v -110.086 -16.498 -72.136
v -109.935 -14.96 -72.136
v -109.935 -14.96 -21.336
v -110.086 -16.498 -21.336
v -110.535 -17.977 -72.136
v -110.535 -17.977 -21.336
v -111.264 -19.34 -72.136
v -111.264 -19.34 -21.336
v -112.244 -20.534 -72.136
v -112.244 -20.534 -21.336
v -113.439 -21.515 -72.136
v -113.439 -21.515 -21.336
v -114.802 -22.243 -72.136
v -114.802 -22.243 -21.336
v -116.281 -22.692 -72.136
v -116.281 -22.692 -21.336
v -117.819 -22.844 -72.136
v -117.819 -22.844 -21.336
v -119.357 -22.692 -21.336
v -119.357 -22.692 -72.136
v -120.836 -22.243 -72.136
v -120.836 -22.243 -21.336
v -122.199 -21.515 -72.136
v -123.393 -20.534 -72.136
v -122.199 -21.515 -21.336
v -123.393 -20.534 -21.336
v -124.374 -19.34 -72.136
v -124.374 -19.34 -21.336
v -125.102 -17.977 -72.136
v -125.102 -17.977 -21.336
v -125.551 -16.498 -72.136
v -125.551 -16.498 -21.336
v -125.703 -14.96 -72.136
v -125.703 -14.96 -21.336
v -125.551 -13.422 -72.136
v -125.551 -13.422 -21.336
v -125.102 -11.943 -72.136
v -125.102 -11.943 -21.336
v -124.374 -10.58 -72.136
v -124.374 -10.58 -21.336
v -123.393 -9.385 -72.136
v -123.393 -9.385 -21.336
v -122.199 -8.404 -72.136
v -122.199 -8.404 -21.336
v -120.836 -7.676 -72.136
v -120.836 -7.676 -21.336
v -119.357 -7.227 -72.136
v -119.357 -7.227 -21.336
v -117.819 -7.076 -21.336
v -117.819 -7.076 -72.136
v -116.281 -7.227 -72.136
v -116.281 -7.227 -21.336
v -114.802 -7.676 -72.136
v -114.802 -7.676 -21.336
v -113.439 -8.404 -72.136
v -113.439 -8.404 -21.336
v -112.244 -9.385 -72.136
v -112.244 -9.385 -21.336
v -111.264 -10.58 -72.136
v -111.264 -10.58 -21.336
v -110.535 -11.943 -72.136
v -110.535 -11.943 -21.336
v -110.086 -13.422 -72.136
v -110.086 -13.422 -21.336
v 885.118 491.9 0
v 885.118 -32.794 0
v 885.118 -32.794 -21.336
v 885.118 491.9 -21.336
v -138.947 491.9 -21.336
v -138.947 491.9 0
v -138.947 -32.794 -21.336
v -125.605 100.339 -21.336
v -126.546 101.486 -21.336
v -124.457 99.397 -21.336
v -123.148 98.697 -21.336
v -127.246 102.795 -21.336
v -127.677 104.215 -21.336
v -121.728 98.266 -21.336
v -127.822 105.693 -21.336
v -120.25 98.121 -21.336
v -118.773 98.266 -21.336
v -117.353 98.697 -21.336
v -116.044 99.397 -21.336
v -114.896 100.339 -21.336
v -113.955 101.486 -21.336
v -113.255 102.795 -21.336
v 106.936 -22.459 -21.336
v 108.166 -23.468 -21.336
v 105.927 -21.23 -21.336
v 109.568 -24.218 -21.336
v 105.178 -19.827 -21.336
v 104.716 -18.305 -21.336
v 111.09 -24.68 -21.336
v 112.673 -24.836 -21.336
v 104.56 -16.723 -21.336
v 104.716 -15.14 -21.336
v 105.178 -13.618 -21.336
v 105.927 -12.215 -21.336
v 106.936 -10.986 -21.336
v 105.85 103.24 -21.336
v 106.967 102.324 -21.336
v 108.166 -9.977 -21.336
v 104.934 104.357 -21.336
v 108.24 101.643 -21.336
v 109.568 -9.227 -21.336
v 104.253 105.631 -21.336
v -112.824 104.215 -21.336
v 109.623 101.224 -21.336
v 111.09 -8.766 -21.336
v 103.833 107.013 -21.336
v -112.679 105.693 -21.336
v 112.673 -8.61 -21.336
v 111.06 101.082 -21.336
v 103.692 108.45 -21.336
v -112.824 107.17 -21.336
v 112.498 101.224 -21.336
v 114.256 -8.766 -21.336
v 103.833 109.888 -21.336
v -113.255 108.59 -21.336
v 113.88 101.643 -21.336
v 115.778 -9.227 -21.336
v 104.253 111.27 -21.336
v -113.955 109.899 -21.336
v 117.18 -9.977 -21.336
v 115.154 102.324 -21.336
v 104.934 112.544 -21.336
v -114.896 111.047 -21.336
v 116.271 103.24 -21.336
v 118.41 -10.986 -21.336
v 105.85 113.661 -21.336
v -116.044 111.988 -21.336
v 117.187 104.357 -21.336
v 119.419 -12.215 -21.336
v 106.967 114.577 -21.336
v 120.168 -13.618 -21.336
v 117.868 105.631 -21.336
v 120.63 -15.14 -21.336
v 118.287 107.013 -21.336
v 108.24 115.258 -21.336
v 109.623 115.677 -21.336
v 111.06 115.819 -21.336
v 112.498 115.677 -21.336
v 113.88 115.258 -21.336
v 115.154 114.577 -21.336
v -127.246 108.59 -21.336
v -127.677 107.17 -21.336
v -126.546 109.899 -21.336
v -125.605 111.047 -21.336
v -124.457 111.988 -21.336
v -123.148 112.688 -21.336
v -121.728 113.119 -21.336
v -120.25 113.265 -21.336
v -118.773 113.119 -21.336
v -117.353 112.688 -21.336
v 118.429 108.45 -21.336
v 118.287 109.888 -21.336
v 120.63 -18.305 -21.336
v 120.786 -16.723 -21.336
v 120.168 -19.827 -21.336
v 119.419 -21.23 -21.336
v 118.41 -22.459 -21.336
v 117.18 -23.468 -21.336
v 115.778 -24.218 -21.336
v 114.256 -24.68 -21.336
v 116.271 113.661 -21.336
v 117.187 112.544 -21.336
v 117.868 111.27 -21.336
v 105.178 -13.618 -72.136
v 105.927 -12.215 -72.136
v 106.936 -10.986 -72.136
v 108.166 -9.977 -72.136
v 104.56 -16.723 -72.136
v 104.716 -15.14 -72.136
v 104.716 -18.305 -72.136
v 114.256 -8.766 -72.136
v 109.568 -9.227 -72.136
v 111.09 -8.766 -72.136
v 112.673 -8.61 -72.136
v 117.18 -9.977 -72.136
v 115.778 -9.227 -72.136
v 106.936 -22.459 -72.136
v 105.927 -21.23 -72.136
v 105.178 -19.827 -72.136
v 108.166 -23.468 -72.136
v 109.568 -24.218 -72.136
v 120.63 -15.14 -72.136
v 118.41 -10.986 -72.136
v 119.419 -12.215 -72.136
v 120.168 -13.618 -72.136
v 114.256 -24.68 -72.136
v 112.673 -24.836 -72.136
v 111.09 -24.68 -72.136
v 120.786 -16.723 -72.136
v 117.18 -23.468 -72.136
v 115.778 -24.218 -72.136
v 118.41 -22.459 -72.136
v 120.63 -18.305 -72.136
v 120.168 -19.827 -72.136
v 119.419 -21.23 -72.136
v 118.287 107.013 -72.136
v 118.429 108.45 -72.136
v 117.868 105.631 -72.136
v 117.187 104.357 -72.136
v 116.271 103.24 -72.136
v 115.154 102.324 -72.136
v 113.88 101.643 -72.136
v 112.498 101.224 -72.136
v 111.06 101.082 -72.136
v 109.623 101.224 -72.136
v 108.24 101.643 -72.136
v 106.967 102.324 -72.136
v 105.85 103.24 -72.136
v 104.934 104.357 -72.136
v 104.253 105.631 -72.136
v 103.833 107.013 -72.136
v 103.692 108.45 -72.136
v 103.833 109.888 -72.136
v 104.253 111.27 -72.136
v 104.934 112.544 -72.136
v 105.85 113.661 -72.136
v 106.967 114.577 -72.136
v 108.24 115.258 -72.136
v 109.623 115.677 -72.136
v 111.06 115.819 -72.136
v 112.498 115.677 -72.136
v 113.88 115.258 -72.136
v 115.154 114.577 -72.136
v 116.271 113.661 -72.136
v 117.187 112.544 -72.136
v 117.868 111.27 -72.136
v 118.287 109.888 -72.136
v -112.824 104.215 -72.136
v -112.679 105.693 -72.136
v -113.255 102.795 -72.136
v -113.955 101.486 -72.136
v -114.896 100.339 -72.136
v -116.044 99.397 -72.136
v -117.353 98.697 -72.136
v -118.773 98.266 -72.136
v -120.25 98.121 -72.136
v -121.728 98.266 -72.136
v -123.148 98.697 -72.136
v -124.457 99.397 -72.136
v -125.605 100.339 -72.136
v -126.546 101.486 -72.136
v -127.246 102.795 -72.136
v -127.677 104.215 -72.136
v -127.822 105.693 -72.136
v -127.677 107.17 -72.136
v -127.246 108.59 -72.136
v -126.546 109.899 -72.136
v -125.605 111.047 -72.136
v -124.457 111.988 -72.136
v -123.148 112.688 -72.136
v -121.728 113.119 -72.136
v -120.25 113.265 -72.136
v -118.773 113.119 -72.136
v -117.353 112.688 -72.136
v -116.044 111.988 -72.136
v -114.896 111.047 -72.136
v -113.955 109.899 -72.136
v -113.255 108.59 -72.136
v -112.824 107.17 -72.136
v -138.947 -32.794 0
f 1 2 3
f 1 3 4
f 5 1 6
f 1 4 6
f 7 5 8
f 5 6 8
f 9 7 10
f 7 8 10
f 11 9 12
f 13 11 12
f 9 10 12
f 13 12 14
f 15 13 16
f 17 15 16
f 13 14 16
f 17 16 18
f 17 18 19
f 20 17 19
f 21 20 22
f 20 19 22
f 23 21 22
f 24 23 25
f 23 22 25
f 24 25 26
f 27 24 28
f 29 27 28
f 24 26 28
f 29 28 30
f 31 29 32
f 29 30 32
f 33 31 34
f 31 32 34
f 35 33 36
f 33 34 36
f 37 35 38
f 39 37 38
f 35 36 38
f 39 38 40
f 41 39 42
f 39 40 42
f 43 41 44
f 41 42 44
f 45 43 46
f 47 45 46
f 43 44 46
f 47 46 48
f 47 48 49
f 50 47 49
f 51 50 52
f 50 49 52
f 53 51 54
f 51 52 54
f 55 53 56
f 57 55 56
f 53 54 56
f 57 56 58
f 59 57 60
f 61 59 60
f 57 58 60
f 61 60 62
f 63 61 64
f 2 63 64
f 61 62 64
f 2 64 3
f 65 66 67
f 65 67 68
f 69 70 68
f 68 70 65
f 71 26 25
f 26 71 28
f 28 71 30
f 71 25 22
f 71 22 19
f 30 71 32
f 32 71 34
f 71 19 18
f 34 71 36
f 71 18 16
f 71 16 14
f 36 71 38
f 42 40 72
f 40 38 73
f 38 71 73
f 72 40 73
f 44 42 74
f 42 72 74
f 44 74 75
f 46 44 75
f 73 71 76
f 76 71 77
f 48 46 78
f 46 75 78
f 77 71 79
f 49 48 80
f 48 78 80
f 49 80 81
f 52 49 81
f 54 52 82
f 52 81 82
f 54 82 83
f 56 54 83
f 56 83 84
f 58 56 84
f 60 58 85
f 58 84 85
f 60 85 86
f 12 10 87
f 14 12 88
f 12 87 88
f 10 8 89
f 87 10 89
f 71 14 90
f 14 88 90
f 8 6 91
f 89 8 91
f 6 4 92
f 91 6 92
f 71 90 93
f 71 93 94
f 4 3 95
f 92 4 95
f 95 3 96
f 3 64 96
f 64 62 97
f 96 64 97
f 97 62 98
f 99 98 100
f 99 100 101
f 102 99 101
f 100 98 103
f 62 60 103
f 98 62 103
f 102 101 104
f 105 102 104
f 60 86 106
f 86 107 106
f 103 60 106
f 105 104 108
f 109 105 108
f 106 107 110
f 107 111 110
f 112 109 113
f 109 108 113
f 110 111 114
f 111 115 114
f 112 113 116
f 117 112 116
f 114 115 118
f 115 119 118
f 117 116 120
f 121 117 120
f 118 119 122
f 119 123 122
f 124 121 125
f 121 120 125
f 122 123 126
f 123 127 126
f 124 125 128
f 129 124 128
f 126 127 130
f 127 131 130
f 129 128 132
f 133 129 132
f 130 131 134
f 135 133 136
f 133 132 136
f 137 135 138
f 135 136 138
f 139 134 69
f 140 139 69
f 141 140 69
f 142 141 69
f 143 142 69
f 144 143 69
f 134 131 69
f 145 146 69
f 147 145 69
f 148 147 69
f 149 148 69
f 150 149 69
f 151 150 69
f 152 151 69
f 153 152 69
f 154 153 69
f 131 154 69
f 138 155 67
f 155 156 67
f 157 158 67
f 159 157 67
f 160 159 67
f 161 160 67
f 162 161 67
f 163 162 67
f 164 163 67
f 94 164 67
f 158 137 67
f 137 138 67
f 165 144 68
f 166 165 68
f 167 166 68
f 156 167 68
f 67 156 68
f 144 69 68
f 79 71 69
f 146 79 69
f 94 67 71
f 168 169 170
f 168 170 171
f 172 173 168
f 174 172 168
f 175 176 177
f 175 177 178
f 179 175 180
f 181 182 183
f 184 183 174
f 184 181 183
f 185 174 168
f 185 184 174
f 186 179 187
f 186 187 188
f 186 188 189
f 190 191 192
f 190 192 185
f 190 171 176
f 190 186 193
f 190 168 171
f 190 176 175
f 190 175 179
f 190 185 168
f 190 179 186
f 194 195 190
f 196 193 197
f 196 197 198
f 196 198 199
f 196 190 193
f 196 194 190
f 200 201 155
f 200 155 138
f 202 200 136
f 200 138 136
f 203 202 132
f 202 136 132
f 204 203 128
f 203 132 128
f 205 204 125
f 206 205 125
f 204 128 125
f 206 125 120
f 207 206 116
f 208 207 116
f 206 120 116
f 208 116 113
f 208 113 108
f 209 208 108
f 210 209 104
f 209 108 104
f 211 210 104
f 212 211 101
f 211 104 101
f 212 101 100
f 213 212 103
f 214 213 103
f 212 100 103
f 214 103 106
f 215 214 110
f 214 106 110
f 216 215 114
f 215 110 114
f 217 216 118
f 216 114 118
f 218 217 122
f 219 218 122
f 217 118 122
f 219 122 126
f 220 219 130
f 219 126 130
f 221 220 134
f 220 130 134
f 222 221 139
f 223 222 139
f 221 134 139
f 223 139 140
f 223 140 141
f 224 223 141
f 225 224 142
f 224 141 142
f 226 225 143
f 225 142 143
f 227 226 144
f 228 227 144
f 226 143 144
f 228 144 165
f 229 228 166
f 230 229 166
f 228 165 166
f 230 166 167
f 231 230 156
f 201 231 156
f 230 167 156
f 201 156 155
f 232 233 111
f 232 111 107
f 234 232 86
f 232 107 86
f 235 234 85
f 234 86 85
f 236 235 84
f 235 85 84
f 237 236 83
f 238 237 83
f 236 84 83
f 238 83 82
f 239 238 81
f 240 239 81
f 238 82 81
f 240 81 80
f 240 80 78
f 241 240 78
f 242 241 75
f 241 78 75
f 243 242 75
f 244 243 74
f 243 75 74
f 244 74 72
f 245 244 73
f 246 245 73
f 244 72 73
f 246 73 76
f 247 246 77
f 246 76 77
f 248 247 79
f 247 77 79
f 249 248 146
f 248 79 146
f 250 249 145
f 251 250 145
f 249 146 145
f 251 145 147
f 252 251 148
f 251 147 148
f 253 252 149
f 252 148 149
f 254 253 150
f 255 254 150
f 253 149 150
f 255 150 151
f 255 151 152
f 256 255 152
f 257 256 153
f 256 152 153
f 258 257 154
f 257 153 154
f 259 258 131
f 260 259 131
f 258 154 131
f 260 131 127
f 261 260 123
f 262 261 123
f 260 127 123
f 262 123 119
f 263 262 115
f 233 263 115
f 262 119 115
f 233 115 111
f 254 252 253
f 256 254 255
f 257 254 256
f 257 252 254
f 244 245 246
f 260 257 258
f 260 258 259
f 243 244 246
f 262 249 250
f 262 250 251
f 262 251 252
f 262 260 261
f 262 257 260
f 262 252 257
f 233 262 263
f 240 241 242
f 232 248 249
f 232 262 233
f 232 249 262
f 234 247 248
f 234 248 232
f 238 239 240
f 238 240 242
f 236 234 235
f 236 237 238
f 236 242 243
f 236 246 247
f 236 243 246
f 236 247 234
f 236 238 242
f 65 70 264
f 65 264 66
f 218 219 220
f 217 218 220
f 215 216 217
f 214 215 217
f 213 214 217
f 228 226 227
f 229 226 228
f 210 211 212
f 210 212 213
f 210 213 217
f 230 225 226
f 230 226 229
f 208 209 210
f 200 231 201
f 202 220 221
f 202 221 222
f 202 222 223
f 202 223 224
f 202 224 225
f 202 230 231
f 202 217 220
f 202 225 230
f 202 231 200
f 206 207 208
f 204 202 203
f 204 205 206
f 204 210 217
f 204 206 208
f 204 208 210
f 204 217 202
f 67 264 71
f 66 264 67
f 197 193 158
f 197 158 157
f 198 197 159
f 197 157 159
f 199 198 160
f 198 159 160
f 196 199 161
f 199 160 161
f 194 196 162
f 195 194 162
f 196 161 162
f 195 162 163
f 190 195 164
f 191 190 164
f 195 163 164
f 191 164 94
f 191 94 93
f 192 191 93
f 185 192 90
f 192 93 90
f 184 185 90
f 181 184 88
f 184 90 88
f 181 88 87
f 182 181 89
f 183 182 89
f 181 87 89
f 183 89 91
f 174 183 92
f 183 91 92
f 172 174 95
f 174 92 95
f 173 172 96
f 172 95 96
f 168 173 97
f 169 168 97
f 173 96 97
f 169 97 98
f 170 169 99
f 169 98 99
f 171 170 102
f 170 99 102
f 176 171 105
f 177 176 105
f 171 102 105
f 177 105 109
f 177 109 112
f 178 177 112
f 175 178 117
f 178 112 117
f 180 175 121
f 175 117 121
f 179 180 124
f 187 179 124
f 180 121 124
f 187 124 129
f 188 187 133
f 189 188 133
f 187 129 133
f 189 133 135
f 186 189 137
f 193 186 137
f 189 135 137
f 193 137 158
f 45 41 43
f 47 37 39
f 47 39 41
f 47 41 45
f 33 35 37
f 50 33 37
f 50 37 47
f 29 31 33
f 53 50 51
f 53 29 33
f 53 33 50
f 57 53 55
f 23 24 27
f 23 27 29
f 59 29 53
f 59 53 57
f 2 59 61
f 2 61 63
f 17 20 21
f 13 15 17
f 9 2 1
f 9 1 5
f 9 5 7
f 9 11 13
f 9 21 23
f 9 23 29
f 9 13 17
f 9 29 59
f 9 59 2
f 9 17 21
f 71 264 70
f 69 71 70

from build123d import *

# Parameters (mm, degrees)
F0_W     = 1024.064392
F0_H     = 524.694004
F1_DEPTH = 21.336
F2_R     = 7.883837
F3_DEPTH = 50.8
F4_R     = 7.571869
F5_DEPTH = 50.8
F6_R     = 7.368514
F7_DEPTH = 50.8
F8_R     = 8.112976
F9_DEPTH = 50.8


with BuildPart() as f1:
    # F0 (on Top) → F1 (new body)
    with BuildSketch(Plane.XY):
        with Locations((373.085335, 229.552608)):
            Rectangle(F0_W, F0_H)
    extrude(amount=-F1_DEPTH)

    # F2 (on face) → F3 (join)
    with BuildSketch(Plane(origin=(0, 0, -21.336), x_dir=(1, 0, 0), z_dir=(0, 0, -1))):
        with Locations((-117.818758, 14.959664)):
            Circle(F2_R)
    extrude(amount=F3_DEPTH)

    # F4 (on face) → F5 (join)
    with BuildSketch(Plane(origin=(0, 0, -21.336), x_dir=(1, 0, 0), z_dir=(0, 0, -1))):
        with Locations((-120.250419, -105.692685)):
            Circle(F4_R)
    extrude(amount=F5_DEPTH)

    # F6 (on face) → F7 (join)
    with BuildSketch(Plane(origin=(0, 0, -21.336), x_dir=(1, 0, 0), z_dir=(0, 0, -1))):
        with Locations((111.060277, -108.45048)):
            Circle(F6_R)
    extrude(amount=F7_DEPTH)

    # F8 (on face) → F9 (join)
    with BuildSketch(Plane(origin=(0, 0, -21.336), x_dir=(1, 0, 0), z_dir=(0, 0, -1))):
        with Locations((112.673059, 16.722616)):
            Circle(F8_R)
    extrude(amount=F9_DEPTH)


solid = f1.part
